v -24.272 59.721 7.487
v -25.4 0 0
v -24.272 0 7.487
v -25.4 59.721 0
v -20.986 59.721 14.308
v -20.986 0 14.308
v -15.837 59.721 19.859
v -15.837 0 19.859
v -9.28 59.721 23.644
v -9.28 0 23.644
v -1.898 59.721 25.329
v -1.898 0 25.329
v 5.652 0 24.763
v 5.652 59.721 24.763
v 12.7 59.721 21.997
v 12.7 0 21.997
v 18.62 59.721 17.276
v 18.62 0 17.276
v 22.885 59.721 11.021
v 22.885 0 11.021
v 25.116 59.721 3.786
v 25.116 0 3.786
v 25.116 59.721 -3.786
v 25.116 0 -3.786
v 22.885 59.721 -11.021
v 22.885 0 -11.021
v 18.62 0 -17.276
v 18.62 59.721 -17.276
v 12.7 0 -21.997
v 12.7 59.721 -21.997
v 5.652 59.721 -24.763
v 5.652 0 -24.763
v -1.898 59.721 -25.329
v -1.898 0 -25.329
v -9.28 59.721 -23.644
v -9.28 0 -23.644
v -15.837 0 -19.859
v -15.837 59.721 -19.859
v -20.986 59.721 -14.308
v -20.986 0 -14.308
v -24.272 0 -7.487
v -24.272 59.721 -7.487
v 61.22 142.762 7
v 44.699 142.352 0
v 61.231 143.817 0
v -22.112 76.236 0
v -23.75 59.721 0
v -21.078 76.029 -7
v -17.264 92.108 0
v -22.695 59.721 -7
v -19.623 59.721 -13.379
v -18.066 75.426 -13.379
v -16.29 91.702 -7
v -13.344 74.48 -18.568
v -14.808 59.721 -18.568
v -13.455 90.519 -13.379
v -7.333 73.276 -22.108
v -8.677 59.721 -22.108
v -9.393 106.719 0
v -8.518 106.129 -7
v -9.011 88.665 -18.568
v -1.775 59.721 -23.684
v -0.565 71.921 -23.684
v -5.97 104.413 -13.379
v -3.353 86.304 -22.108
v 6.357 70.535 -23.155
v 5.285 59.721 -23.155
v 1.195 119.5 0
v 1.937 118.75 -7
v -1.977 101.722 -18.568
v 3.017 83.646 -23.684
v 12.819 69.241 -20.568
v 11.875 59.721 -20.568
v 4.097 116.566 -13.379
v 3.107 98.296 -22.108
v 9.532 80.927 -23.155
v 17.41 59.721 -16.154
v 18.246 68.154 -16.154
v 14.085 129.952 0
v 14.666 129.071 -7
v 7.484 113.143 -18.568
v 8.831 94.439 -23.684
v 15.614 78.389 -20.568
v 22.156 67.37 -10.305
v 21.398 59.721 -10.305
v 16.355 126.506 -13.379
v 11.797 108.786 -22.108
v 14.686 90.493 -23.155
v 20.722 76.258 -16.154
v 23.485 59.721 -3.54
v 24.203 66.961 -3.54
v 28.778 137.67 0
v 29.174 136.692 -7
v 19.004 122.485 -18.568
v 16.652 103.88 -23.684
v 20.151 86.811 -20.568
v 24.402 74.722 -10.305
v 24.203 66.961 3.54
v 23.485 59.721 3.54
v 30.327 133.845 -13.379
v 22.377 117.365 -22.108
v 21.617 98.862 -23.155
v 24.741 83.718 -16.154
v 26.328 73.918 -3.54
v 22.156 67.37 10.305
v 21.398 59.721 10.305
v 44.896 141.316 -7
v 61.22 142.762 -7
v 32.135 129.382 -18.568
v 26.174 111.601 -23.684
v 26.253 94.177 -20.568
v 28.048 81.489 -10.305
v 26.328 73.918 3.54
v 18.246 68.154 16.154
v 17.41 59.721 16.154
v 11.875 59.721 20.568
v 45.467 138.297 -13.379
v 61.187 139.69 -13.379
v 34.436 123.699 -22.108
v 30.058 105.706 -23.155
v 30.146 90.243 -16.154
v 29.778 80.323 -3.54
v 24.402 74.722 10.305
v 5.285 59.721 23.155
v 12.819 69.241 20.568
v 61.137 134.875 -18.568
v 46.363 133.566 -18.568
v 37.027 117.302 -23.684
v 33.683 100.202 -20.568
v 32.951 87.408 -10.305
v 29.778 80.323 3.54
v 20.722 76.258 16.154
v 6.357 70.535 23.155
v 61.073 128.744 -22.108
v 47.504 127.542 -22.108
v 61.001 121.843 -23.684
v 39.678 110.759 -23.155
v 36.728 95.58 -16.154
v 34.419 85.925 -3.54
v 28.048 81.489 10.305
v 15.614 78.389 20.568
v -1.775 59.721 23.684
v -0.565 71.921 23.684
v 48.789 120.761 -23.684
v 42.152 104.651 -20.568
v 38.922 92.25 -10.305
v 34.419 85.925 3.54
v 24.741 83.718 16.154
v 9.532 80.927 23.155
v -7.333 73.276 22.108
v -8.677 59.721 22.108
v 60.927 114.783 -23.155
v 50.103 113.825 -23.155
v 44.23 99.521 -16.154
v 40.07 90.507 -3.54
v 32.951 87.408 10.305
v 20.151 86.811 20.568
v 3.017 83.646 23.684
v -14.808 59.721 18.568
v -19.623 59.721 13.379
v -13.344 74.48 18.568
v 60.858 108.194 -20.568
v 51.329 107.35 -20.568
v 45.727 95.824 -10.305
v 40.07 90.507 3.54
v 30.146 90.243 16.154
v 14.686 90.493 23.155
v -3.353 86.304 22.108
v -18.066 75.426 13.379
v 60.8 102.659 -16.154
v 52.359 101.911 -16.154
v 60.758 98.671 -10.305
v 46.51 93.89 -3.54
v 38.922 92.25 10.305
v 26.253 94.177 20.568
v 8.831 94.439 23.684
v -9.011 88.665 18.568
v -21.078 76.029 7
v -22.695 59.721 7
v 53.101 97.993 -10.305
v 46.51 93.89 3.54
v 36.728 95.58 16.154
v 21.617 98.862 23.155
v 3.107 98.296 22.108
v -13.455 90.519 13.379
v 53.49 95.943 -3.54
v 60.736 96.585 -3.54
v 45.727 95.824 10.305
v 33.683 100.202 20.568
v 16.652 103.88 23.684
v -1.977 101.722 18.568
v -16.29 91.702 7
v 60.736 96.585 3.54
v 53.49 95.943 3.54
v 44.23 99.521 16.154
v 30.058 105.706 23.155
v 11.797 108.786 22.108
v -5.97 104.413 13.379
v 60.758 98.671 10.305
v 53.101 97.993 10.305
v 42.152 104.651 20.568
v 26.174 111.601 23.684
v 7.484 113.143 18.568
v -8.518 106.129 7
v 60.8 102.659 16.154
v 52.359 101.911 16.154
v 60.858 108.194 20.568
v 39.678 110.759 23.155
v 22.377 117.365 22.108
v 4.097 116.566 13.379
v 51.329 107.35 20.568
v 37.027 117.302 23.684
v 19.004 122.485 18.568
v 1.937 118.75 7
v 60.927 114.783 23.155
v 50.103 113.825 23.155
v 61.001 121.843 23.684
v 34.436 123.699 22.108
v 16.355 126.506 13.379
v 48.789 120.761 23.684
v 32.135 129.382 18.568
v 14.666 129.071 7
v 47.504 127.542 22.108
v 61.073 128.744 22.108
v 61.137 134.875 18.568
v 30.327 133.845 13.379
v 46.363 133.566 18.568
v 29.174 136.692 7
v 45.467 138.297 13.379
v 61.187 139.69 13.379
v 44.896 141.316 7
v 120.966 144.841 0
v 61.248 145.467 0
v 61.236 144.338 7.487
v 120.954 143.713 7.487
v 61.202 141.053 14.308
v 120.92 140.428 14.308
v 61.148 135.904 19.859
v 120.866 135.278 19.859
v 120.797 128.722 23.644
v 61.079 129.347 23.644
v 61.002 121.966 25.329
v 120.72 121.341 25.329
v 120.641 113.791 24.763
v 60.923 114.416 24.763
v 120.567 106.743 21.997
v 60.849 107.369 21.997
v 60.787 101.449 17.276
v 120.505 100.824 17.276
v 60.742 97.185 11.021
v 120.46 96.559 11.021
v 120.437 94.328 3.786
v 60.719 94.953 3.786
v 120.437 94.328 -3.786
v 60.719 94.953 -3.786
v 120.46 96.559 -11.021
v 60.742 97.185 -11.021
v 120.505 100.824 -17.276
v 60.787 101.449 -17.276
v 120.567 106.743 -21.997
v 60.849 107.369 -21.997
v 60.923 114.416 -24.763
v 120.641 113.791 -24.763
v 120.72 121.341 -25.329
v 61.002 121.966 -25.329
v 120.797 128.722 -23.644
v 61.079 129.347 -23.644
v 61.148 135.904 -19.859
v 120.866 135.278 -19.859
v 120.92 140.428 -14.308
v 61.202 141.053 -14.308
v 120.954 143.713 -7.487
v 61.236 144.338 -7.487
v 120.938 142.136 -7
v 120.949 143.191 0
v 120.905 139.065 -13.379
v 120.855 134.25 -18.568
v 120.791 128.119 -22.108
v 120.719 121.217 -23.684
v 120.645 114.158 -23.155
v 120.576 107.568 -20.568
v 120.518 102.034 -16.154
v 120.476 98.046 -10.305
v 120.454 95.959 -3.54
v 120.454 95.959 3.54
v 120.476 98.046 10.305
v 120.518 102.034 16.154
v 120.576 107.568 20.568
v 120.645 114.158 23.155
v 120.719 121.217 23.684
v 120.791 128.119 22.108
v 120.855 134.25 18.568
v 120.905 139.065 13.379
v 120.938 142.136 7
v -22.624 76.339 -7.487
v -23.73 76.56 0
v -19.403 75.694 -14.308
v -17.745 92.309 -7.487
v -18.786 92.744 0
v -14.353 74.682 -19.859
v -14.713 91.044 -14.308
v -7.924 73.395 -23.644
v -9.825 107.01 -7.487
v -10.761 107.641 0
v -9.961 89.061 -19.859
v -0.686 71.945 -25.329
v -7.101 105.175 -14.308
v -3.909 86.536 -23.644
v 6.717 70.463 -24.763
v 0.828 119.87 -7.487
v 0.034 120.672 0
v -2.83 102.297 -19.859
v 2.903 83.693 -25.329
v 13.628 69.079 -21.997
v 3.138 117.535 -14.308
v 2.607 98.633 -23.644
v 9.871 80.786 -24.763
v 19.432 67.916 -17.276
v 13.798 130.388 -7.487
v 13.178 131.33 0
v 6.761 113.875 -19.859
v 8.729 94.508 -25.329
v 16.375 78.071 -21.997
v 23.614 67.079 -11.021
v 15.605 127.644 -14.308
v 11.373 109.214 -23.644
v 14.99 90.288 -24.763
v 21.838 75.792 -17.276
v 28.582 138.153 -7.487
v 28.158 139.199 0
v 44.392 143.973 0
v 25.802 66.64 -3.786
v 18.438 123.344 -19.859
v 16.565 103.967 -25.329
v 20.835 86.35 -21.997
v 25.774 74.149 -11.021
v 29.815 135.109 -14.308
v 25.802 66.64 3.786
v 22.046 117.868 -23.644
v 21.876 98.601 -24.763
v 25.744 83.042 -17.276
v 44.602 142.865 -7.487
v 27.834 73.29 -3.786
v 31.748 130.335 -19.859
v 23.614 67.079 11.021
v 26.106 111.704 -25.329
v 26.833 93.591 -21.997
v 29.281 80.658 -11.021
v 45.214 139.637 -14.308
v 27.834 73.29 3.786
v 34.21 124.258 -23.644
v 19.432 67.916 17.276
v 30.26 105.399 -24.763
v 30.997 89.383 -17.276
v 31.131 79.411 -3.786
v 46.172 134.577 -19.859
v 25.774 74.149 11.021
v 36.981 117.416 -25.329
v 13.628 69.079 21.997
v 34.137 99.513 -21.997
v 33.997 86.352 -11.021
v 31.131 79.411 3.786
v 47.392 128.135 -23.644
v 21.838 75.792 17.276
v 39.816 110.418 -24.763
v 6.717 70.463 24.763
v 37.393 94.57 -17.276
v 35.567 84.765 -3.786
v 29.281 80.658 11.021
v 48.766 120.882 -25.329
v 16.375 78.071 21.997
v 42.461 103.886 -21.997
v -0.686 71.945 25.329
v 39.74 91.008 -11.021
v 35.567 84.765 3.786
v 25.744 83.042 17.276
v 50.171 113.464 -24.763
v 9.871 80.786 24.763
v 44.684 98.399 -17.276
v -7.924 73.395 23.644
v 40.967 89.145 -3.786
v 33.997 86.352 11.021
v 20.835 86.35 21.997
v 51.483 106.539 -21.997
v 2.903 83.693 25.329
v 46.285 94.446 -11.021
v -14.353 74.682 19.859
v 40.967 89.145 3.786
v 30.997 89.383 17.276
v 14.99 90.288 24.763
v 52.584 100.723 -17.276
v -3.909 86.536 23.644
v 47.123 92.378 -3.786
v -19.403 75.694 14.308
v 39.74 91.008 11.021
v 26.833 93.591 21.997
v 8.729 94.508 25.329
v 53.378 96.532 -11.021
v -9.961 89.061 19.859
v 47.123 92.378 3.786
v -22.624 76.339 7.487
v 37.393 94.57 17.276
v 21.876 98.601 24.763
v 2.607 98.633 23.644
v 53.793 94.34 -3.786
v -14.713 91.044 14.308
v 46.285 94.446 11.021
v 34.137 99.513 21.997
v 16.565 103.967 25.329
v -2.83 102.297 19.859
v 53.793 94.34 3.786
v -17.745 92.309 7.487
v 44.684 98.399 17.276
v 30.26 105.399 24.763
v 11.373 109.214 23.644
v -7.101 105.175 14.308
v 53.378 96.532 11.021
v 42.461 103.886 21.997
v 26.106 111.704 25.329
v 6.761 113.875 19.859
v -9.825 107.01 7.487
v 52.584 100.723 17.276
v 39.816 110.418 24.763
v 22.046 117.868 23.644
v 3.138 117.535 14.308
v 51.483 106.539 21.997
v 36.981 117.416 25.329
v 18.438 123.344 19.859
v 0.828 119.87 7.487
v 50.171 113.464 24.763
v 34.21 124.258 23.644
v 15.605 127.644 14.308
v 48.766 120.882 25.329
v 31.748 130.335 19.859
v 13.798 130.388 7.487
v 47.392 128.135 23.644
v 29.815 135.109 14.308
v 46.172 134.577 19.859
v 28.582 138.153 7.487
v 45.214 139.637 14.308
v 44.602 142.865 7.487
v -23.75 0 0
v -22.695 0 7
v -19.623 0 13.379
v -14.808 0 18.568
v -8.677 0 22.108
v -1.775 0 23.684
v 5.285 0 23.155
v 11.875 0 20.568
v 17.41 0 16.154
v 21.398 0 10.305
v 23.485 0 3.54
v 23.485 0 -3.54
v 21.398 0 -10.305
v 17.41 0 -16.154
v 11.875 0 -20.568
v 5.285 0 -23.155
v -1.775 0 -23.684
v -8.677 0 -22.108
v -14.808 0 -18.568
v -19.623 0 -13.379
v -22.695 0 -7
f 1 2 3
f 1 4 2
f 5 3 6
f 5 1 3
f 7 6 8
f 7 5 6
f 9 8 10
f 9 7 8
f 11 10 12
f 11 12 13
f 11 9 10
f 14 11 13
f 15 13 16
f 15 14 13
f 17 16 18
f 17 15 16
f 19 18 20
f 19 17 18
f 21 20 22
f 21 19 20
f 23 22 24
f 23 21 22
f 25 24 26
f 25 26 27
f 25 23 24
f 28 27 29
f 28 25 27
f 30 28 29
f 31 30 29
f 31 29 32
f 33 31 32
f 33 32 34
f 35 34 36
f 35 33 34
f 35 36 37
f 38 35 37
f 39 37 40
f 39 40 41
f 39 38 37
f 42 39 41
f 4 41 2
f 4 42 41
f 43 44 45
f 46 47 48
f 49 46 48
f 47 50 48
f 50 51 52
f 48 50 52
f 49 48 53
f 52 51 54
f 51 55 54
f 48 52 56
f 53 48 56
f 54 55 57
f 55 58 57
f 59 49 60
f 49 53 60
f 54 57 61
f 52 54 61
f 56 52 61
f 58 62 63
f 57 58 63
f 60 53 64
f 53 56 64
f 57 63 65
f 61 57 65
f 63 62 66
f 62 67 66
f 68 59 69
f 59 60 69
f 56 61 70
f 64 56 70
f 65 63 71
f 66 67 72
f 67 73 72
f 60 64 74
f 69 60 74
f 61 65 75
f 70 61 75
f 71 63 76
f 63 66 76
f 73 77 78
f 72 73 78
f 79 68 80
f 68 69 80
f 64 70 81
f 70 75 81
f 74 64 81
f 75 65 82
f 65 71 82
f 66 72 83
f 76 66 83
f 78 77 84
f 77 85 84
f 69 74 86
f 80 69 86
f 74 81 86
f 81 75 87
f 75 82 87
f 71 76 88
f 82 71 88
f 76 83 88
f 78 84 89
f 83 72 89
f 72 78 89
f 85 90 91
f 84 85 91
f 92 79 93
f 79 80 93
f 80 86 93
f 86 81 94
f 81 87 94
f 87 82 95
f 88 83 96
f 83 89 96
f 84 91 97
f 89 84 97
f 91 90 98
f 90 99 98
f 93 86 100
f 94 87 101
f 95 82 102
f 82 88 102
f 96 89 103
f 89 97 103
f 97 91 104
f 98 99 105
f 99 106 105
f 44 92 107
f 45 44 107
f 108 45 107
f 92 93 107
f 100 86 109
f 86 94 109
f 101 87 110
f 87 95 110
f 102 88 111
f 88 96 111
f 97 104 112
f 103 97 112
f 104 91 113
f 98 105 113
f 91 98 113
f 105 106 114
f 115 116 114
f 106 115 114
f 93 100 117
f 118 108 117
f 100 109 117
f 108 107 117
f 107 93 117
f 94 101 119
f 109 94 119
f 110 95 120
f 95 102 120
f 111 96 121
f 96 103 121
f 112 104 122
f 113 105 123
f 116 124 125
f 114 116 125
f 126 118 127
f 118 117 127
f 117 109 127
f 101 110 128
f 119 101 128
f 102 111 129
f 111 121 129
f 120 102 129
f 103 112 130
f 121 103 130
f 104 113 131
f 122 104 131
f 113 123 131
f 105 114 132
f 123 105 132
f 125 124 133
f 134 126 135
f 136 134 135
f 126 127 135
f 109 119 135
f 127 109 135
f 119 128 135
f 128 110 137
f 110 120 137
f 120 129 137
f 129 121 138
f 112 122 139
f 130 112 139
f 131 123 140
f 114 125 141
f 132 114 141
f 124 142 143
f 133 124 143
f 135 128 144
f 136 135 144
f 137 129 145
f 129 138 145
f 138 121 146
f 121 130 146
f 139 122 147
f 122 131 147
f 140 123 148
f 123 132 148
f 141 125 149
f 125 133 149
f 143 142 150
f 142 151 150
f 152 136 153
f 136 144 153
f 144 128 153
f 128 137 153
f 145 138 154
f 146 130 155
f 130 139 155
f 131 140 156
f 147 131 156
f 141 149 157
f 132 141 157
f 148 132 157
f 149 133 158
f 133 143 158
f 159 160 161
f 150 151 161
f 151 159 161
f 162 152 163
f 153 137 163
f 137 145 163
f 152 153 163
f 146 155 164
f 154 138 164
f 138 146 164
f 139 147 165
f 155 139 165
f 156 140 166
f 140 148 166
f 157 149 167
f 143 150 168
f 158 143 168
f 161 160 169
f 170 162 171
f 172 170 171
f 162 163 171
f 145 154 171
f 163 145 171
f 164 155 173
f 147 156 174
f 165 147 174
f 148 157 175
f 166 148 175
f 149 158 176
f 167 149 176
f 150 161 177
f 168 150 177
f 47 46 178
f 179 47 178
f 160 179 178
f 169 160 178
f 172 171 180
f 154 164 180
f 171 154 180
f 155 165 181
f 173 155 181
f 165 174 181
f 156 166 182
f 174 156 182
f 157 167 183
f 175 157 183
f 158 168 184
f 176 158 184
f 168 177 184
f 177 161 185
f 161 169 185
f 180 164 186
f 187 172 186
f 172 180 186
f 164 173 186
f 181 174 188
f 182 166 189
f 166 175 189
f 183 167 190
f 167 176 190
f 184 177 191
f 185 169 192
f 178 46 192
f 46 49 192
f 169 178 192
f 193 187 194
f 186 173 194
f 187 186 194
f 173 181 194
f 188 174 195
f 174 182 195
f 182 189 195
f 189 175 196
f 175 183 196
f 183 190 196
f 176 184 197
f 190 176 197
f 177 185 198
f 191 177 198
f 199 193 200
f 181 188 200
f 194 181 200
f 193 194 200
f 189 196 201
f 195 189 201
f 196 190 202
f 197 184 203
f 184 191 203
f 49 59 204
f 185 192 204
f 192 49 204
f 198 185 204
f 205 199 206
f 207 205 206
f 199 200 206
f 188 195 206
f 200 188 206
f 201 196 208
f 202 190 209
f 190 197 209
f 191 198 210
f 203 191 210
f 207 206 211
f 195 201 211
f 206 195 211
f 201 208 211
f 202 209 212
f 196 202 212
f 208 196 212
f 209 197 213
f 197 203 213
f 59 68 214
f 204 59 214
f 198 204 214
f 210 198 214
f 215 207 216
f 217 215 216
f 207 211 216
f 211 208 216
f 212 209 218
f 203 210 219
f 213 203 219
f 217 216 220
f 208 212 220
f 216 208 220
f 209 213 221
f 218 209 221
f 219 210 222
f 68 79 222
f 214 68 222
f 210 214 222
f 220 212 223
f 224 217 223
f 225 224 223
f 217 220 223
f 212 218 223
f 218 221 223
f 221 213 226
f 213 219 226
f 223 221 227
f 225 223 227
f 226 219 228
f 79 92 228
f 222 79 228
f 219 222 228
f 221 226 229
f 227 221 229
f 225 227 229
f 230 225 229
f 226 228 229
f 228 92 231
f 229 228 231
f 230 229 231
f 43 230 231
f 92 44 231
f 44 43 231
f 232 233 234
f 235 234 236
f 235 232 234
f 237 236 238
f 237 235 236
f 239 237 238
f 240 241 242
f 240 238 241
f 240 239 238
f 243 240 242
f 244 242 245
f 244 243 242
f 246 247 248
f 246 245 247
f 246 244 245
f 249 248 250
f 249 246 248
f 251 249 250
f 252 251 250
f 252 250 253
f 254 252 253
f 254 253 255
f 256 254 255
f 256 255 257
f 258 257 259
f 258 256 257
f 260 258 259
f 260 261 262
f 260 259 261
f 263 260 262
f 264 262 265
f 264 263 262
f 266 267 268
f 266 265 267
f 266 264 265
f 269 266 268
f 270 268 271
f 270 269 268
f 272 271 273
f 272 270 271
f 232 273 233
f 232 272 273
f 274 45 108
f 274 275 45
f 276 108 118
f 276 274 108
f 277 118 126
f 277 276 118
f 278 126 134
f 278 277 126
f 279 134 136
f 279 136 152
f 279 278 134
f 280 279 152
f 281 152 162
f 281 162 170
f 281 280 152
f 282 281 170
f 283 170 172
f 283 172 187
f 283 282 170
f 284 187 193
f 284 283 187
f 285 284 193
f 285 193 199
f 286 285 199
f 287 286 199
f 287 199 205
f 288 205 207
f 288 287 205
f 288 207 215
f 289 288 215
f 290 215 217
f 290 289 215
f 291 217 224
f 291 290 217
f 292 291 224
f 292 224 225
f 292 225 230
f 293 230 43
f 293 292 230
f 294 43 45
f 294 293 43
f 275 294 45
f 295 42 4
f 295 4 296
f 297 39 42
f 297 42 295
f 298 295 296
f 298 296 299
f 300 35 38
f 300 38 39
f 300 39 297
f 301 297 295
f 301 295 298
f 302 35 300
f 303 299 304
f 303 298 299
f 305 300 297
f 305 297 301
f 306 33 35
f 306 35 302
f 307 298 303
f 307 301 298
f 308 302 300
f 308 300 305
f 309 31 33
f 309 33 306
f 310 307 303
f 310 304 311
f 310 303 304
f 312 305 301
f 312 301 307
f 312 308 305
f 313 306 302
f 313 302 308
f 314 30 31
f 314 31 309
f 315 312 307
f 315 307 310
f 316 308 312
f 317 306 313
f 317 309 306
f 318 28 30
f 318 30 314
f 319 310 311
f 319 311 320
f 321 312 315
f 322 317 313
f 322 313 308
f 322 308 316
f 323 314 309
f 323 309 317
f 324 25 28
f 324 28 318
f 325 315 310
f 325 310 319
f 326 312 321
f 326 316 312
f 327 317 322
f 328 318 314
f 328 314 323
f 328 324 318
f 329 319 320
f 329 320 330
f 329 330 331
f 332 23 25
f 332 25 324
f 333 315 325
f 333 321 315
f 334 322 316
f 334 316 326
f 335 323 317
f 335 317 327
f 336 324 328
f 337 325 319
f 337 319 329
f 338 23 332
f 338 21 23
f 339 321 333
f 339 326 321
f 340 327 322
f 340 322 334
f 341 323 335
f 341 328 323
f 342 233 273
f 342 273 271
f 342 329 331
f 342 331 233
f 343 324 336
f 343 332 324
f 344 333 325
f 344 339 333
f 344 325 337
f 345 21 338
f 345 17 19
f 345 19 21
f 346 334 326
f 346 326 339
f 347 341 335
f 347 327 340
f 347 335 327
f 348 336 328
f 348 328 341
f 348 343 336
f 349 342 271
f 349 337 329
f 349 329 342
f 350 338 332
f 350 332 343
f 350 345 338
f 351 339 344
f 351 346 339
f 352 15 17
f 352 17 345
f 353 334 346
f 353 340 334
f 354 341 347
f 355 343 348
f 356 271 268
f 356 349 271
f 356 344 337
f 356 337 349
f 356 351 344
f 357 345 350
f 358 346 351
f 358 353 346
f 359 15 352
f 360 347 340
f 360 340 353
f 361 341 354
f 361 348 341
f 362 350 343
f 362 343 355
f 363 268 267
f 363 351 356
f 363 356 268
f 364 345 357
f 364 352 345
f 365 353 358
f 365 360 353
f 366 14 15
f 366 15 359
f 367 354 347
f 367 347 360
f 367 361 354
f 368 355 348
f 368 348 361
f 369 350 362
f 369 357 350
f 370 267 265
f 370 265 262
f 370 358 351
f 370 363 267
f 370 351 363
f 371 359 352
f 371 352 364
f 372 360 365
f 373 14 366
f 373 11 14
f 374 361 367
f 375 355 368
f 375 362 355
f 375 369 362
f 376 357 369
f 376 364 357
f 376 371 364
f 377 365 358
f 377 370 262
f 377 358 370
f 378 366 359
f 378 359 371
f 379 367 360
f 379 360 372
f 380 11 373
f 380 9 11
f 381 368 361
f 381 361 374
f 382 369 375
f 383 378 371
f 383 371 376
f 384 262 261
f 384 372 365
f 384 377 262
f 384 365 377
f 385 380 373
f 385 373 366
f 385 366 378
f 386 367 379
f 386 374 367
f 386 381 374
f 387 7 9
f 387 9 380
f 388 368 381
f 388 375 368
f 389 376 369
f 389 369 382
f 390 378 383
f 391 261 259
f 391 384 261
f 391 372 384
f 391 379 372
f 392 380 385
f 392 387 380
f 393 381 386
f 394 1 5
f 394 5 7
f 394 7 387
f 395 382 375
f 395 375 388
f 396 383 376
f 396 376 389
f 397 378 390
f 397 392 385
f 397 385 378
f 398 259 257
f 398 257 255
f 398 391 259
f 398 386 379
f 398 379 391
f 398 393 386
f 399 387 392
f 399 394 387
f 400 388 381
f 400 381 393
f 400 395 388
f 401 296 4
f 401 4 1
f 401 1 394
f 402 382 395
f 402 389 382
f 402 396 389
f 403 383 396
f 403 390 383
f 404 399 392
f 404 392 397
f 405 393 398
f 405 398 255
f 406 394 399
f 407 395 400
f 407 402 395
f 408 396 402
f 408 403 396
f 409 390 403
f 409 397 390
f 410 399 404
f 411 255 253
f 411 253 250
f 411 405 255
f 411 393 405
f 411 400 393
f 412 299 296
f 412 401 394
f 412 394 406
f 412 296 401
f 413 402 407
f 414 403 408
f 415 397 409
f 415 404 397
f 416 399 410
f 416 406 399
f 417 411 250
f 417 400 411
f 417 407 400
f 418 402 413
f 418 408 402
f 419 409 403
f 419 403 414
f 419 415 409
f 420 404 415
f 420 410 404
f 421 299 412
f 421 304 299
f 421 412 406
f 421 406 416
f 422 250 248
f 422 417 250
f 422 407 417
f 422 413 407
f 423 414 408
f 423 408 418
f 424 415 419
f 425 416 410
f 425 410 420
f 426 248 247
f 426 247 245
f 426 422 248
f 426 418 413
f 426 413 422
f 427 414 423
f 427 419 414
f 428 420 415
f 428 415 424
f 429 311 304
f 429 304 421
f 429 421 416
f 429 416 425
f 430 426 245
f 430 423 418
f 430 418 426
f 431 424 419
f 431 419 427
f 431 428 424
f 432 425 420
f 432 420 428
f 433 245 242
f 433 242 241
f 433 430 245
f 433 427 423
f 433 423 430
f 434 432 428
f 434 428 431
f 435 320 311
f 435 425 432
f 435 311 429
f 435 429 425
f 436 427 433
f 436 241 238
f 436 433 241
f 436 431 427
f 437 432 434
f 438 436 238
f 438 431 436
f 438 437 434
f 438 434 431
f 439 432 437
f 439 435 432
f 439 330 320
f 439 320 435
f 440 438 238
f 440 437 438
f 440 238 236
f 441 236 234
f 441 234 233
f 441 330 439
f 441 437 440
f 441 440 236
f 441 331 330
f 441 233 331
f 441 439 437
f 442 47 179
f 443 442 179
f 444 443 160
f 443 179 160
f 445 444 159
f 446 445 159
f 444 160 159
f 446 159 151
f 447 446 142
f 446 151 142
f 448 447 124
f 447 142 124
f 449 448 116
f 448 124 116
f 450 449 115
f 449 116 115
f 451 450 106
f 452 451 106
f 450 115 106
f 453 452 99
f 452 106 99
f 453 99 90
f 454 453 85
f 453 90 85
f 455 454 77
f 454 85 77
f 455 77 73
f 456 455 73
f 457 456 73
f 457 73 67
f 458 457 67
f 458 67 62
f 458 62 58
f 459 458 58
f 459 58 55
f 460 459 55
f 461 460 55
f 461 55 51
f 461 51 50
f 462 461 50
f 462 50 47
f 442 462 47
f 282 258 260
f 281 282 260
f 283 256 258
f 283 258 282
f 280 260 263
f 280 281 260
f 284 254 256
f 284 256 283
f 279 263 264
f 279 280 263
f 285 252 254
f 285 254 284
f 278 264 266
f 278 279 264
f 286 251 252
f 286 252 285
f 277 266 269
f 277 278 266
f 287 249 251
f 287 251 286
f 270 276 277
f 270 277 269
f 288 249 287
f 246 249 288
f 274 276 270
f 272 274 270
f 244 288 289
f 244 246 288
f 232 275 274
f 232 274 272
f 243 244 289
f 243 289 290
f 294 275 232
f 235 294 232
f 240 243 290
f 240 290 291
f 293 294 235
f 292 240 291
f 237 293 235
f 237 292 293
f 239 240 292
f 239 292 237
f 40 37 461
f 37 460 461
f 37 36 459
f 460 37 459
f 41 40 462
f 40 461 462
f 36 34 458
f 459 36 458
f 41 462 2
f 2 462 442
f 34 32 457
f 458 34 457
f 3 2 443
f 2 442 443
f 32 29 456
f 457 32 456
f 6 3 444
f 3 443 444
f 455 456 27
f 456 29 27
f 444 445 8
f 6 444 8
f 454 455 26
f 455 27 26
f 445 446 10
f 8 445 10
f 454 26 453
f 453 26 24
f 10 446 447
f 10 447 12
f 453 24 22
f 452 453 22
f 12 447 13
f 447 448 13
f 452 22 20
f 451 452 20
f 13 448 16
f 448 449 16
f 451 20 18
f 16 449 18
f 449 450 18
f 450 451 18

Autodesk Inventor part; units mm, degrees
ref_plane "YZ Plane" through (0, 0, 0) normal (1, 0, 0) x (0, 1, 0)
ref_plane "XZ Plane" through (0, 0, 0) normal (0, 1, 0) x (-1, 0, 0)
ref_plane "XY Plane" through (0, 0, 0) normal (0, 0, 1) x (1, 0, 0)
sketch "Sketch1" plane through (0, 0, 0) normal (0, 0, 1) x (1, 0, 0)
  line L0 (0, 0) -> (0, 59.721302)
  line L1 (60.981972, 120.067993) -> (120.7, 119.442605)
  arc A0 (60.981972, 120.067993) -> (0, 59.721302) centre (60.35, 59.721302) ccw
  dimension "d0" = 120.7
  dimension "d1" = 120.7
  dimension "d2" = 60.35
  dimension "d7" = 89.4
sketch "Sketch2" plane through (0, 0, 0) normal (0, 1, 0) x (-1, 0, 0)
  circle A0 centre (0, 0) radius 25.4
  circle A1 centre (0, 0) radius 23.75
  dimension "d4" = 1.65
  dimension "d5" = 50.8
sweep "Sweep1" add profiles "Sketch2" path "Sketch1"
equation "\"d1\" = d0"
equation "\"d2\" = 0.5 * d0"
properties part number "ASME BPE - 89.4 DEG Elbow-50.8"
